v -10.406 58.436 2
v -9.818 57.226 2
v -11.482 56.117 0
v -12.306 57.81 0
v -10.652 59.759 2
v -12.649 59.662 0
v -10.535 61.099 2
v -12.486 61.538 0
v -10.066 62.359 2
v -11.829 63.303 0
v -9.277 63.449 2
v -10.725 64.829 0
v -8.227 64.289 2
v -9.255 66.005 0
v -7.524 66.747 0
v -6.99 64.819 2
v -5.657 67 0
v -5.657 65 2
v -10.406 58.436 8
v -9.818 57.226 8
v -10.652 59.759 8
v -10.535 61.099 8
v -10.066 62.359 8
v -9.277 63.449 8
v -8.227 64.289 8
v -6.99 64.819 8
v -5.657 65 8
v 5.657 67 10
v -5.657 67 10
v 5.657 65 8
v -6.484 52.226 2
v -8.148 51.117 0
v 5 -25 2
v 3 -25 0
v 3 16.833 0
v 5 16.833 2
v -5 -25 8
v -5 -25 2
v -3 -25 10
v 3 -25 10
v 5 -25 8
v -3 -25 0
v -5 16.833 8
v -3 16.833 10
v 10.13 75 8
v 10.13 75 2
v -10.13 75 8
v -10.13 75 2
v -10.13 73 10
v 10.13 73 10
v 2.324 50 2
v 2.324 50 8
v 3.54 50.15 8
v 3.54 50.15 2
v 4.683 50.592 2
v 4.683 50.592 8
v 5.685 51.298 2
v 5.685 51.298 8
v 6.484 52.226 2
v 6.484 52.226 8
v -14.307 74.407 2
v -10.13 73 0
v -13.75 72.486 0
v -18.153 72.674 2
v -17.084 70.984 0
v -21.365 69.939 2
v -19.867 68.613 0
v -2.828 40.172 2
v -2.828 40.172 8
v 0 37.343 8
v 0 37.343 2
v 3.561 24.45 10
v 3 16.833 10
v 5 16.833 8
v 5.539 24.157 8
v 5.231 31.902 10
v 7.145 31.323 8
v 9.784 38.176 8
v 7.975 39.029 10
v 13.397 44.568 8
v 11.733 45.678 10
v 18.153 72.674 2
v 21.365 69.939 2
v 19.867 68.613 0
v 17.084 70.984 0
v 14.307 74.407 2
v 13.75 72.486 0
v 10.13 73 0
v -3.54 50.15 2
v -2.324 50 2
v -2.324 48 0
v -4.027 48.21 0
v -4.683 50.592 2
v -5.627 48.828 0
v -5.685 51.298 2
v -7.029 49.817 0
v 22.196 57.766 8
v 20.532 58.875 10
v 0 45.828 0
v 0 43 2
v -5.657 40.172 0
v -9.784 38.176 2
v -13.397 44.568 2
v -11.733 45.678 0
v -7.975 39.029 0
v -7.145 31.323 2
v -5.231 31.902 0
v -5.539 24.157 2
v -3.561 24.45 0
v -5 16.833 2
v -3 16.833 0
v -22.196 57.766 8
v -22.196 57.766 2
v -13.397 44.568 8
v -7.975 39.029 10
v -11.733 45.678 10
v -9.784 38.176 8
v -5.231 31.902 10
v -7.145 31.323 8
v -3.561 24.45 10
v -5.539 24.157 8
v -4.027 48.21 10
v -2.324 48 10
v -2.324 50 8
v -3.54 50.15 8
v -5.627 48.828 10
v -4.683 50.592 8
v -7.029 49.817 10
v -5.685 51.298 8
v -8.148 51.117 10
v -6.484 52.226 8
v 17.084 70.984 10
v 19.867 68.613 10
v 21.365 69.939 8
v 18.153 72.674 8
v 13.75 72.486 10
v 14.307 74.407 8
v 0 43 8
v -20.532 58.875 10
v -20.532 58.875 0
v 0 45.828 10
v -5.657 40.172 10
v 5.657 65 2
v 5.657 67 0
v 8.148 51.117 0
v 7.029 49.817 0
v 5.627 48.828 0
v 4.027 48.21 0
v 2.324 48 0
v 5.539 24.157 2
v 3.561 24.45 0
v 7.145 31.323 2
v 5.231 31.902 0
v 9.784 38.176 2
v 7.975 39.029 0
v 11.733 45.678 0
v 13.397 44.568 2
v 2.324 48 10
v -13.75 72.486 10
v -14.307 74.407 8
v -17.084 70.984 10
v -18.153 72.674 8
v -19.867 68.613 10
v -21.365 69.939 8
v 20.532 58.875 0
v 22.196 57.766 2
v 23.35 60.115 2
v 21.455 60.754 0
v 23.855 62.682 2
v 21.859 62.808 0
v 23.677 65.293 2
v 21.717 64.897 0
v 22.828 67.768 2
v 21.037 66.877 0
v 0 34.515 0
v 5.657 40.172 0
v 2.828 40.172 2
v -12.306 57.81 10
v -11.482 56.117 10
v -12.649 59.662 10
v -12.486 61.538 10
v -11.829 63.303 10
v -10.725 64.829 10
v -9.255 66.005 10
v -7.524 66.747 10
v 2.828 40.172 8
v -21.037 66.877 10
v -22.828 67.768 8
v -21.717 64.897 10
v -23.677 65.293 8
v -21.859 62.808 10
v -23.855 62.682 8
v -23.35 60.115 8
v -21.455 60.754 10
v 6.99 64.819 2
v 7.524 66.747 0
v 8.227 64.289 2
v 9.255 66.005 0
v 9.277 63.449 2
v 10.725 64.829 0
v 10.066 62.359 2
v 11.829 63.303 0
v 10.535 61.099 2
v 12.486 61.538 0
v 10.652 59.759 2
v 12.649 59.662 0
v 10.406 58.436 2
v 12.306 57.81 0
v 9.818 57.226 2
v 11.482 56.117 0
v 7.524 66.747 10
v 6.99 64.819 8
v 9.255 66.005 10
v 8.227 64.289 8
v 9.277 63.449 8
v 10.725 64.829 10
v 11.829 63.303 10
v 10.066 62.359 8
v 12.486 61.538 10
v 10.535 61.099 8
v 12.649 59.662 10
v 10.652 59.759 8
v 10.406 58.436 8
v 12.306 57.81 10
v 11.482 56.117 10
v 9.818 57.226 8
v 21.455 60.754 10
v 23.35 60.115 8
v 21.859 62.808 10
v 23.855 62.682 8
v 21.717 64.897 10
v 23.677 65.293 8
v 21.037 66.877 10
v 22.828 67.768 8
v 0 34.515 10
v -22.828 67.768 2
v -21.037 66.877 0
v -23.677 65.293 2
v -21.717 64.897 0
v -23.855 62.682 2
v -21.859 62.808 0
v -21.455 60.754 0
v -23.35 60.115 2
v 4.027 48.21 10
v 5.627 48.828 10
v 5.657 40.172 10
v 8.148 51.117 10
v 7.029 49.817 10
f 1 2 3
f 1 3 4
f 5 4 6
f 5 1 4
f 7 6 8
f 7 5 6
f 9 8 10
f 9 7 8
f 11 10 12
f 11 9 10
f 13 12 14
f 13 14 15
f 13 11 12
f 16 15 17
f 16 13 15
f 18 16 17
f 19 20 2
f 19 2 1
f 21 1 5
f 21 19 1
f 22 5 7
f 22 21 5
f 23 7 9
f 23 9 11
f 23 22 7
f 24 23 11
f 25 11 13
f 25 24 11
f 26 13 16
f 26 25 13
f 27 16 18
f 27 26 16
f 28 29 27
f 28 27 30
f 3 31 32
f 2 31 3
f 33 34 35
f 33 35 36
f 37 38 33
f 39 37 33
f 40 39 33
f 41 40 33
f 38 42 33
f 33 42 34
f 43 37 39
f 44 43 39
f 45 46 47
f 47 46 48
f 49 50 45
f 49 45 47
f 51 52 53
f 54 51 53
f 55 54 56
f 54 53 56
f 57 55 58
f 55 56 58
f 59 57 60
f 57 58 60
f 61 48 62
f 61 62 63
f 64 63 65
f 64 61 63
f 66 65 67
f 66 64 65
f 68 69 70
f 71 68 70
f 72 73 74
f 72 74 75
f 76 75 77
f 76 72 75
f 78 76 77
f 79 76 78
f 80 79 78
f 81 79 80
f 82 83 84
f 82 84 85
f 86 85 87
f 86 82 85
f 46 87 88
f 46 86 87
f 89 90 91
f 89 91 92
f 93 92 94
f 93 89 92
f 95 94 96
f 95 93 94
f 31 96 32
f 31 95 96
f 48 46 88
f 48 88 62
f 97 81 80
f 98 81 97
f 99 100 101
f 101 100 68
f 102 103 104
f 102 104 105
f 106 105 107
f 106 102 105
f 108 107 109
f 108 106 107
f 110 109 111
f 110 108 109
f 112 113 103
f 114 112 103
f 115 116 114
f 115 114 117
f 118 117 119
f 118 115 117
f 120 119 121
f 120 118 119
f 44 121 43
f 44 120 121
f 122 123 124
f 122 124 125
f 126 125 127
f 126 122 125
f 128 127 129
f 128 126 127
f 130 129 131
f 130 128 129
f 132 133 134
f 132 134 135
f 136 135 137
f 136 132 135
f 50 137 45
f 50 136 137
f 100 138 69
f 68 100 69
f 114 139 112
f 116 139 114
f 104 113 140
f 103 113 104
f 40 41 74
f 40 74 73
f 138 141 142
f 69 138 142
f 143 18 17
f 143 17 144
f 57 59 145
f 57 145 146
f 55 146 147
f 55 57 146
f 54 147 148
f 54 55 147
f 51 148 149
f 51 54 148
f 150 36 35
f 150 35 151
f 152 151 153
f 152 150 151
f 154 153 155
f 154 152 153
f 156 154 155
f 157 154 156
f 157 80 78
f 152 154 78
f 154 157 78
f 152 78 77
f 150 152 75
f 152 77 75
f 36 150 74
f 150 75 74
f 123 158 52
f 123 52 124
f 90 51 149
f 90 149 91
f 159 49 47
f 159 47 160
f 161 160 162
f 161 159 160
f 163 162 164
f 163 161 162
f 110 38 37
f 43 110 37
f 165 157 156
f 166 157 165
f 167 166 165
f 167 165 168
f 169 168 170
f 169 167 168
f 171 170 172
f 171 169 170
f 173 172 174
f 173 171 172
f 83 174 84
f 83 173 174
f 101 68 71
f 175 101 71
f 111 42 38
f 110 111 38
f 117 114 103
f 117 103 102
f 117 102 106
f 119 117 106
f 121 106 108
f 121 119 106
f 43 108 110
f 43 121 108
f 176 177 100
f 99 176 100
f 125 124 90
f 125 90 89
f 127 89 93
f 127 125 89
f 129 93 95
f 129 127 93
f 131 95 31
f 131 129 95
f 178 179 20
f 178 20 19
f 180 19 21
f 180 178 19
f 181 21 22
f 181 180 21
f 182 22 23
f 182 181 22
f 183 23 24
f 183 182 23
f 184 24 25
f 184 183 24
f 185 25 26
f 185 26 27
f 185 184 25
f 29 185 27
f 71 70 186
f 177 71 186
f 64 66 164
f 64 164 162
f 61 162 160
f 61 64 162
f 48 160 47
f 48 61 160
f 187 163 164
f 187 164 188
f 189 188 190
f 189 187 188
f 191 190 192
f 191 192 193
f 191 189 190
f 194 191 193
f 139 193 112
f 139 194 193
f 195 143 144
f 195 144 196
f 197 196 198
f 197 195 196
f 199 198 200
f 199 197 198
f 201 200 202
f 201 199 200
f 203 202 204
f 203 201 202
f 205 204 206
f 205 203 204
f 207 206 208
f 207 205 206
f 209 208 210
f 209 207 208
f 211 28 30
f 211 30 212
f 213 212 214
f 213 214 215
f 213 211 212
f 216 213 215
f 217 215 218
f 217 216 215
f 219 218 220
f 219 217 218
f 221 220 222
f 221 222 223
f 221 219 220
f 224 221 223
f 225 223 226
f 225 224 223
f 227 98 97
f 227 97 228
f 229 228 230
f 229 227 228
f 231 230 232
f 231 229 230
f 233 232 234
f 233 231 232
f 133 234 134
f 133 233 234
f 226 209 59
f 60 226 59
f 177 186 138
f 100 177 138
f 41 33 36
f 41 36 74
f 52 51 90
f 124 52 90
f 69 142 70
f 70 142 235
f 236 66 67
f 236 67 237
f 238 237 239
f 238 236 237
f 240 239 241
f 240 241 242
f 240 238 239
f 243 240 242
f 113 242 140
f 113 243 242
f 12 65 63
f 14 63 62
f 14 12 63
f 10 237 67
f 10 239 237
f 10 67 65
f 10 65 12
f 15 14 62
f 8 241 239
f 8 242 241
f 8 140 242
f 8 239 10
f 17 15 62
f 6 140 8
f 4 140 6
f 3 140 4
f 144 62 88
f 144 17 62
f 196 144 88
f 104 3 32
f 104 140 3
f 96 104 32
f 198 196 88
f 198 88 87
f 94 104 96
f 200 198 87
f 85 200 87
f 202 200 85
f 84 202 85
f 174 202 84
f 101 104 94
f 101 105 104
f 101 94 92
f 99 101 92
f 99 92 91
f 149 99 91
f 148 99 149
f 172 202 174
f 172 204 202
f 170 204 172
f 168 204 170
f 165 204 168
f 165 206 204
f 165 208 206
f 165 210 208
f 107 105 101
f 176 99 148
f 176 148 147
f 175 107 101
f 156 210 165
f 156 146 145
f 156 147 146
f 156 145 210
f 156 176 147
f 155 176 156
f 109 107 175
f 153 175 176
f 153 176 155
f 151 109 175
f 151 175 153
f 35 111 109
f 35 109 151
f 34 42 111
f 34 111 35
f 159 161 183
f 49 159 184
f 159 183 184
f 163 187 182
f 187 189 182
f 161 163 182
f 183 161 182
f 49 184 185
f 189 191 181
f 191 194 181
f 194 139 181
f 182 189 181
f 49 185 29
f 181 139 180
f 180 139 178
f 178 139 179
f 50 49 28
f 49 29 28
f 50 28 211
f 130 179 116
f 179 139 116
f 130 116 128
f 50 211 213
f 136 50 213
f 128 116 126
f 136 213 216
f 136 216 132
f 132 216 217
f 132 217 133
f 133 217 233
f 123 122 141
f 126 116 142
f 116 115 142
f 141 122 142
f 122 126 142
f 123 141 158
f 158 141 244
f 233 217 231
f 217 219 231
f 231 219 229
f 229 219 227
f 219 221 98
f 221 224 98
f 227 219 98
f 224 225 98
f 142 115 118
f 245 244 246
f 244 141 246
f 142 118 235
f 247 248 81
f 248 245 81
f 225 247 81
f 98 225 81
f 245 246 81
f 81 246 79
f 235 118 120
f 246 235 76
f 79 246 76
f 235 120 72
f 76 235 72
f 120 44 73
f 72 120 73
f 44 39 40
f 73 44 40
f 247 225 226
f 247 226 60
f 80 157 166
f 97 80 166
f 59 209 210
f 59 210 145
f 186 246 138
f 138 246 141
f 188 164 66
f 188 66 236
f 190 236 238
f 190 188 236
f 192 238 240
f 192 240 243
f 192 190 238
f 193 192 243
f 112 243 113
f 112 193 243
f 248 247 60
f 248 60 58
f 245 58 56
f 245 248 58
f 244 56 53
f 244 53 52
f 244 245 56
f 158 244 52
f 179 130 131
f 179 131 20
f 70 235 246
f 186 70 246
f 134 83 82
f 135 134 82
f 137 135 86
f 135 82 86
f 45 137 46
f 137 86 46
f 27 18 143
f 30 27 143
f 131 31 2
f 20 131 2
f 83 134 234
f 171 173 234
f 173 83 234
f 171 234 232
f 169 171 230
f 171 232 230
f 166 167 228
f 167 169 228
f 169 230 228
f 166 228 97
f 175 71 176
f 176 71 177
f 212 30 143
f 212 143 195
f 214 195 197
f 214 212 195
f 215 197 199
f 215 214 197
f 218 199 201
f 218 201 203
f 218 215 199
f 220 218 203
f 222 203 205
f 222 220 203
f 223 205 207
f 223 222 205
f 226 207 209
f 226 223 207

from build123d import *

# Parameters (mm, degrees)
F0_W        = 30
F0_H        = 10
F1_DEPTH    = 10
F2_R        = 5
F3_T1_DEPTH = 84.348882825
F4_R        = 10
F5_R        = 50
F6_SIZE     = 2
F8_DEPTH    = 10.001
F9_SIZE     = 2
F10_DEPTH   = 16
F11_DEPTH   = 25


# Not quite as in the source:
# - a fillet or chamfer that OpenCascade refuses, or shapes differently, is made with other operations: its cross-section is extruded or revolved along the edge and cut away or added


with BuildPart() as f1:
    # F0 (on Top) → F1 (new body)
    with BuildSketch(Plane.XY):
        Polygon((5, 50), (-5, 50), (-15, 65), (-15, 75), (-25, 75), (-25, 61.9722436227), (-5, 31.9722436227), (-5, -50), (5, -50), (5, 31.9722436227), (25, 61.9722436227), (25, 75), (15, 75), (15, 65), align=None)
        with Locations((0, 70)):
            Rectangle(F0_W, F0_H)
    extrude(amount=F1_DEPTH)

    # F2
    f2_edges = [f1.edges().sort_by_distance(p)[0] for p in [
        (15, 65, 5),
        (-15, 65, 5),
        (-5, 50, 5),
        (5, 50, 5),
    ]]
    fillet(f2_edges, radius=F2_R)

    # F3: fillet of radius 15 on 2 edges, made by hand

    # F3_s2 → F3_t1 (cut)
    with BuildSketch(Plane.XY.offset(-37.1744414125)):
        with BuildLine():
            ThreePointArc((-25, 61.9722436227), (-20.0149678844, 71.2823679771), (-10.130223435, 75))
            Line((-10.130223435, 75), (-25, 75))
            Line((-25, 75), (-25, 61.9722436227))
        make_face()
        with BuildLine():
            ThreePointArc((25, 61.9722436227), (20.0149678844, 71.2823679771), (10.130223435, 75))
            Line((10.130223435, 75), (25, 75))
            Line((25, 75), (25, 61.9722436227))
        make_face()
    extrude(amount=F3_T1_DEPTH, mode=Mode.SUBTRACT)

    # F4
    f4_edges = [f1.edges().sort_by_distance(p)[0] for p in [
        (-25, 61.972244, 5),
        (25, 61.972244, 5),
    ]]
    fillet(f4_edges, radius=F4_R)

    # F5
    f5_edges = [f1.edges().sort_by_distance(p)[0] for p in [
        (5, 31.972244, 5),
        (-5, 31.972244, 5),
    ]]
    fillet(f5_edges, radius=F5_R)

    # F6
    f6_edges = [f1.edges().sort_by_distance(p)[0] for p in [
        (0, 65, 10),
        (0, 75, 10),
        (0, 50, 0),
        (0, 75, 0),
    ]]
    chamfer(f6_edges, length=F6_SIZE)

    # F7 (on face) → F8 (cut, through all)
    with BuildSketch(Plane.XY.offset(10)):
        Polygon((0, 37.3431457505), (2.8284271247, 40.1715728753), (0, 43), (-2.8284271247, 40.1715728753), align=None)
    extrude(amount=-F8_DEPTH, mode=Mode.SUBTRACT)

    # F9
    f9_edges = [f1.edges().sort_by_distance(p)[0] for p in [
        (1.414214, 41.585786, 10),
        (-1.414214, 41.585786, 10),
        (1.414214, 38.757359, 10),
        (-1.414214, 38.757359, 10),
        (1.414214, 38.757359, 0),
        (1.414214, 41.585786, 0),
        (-1.414214, 41.585786, 0),
        (-1.414214, 38.757359, 0),
    ]]
    chamfer(f9_edges, length=F9_SIZE)

    # F10 (add): a face of the model
    f10_faces = [f1.faces().sort_by_distance(p)[0] for p in [
        (0, -50, 5),
    ]]
    extrude(f10_faces, amount=-F10_DEPTH)

    # F11 (cut): a face of the model
    f11_faces = [f1.faces().sort_by_distance(p)[0] for p in [
        (0, -50, 5),
    ]]
    extrude(f11_faces, amount=-F11_DEPTH, mode=Mode.SUBTRACT)


solid = f1.part
